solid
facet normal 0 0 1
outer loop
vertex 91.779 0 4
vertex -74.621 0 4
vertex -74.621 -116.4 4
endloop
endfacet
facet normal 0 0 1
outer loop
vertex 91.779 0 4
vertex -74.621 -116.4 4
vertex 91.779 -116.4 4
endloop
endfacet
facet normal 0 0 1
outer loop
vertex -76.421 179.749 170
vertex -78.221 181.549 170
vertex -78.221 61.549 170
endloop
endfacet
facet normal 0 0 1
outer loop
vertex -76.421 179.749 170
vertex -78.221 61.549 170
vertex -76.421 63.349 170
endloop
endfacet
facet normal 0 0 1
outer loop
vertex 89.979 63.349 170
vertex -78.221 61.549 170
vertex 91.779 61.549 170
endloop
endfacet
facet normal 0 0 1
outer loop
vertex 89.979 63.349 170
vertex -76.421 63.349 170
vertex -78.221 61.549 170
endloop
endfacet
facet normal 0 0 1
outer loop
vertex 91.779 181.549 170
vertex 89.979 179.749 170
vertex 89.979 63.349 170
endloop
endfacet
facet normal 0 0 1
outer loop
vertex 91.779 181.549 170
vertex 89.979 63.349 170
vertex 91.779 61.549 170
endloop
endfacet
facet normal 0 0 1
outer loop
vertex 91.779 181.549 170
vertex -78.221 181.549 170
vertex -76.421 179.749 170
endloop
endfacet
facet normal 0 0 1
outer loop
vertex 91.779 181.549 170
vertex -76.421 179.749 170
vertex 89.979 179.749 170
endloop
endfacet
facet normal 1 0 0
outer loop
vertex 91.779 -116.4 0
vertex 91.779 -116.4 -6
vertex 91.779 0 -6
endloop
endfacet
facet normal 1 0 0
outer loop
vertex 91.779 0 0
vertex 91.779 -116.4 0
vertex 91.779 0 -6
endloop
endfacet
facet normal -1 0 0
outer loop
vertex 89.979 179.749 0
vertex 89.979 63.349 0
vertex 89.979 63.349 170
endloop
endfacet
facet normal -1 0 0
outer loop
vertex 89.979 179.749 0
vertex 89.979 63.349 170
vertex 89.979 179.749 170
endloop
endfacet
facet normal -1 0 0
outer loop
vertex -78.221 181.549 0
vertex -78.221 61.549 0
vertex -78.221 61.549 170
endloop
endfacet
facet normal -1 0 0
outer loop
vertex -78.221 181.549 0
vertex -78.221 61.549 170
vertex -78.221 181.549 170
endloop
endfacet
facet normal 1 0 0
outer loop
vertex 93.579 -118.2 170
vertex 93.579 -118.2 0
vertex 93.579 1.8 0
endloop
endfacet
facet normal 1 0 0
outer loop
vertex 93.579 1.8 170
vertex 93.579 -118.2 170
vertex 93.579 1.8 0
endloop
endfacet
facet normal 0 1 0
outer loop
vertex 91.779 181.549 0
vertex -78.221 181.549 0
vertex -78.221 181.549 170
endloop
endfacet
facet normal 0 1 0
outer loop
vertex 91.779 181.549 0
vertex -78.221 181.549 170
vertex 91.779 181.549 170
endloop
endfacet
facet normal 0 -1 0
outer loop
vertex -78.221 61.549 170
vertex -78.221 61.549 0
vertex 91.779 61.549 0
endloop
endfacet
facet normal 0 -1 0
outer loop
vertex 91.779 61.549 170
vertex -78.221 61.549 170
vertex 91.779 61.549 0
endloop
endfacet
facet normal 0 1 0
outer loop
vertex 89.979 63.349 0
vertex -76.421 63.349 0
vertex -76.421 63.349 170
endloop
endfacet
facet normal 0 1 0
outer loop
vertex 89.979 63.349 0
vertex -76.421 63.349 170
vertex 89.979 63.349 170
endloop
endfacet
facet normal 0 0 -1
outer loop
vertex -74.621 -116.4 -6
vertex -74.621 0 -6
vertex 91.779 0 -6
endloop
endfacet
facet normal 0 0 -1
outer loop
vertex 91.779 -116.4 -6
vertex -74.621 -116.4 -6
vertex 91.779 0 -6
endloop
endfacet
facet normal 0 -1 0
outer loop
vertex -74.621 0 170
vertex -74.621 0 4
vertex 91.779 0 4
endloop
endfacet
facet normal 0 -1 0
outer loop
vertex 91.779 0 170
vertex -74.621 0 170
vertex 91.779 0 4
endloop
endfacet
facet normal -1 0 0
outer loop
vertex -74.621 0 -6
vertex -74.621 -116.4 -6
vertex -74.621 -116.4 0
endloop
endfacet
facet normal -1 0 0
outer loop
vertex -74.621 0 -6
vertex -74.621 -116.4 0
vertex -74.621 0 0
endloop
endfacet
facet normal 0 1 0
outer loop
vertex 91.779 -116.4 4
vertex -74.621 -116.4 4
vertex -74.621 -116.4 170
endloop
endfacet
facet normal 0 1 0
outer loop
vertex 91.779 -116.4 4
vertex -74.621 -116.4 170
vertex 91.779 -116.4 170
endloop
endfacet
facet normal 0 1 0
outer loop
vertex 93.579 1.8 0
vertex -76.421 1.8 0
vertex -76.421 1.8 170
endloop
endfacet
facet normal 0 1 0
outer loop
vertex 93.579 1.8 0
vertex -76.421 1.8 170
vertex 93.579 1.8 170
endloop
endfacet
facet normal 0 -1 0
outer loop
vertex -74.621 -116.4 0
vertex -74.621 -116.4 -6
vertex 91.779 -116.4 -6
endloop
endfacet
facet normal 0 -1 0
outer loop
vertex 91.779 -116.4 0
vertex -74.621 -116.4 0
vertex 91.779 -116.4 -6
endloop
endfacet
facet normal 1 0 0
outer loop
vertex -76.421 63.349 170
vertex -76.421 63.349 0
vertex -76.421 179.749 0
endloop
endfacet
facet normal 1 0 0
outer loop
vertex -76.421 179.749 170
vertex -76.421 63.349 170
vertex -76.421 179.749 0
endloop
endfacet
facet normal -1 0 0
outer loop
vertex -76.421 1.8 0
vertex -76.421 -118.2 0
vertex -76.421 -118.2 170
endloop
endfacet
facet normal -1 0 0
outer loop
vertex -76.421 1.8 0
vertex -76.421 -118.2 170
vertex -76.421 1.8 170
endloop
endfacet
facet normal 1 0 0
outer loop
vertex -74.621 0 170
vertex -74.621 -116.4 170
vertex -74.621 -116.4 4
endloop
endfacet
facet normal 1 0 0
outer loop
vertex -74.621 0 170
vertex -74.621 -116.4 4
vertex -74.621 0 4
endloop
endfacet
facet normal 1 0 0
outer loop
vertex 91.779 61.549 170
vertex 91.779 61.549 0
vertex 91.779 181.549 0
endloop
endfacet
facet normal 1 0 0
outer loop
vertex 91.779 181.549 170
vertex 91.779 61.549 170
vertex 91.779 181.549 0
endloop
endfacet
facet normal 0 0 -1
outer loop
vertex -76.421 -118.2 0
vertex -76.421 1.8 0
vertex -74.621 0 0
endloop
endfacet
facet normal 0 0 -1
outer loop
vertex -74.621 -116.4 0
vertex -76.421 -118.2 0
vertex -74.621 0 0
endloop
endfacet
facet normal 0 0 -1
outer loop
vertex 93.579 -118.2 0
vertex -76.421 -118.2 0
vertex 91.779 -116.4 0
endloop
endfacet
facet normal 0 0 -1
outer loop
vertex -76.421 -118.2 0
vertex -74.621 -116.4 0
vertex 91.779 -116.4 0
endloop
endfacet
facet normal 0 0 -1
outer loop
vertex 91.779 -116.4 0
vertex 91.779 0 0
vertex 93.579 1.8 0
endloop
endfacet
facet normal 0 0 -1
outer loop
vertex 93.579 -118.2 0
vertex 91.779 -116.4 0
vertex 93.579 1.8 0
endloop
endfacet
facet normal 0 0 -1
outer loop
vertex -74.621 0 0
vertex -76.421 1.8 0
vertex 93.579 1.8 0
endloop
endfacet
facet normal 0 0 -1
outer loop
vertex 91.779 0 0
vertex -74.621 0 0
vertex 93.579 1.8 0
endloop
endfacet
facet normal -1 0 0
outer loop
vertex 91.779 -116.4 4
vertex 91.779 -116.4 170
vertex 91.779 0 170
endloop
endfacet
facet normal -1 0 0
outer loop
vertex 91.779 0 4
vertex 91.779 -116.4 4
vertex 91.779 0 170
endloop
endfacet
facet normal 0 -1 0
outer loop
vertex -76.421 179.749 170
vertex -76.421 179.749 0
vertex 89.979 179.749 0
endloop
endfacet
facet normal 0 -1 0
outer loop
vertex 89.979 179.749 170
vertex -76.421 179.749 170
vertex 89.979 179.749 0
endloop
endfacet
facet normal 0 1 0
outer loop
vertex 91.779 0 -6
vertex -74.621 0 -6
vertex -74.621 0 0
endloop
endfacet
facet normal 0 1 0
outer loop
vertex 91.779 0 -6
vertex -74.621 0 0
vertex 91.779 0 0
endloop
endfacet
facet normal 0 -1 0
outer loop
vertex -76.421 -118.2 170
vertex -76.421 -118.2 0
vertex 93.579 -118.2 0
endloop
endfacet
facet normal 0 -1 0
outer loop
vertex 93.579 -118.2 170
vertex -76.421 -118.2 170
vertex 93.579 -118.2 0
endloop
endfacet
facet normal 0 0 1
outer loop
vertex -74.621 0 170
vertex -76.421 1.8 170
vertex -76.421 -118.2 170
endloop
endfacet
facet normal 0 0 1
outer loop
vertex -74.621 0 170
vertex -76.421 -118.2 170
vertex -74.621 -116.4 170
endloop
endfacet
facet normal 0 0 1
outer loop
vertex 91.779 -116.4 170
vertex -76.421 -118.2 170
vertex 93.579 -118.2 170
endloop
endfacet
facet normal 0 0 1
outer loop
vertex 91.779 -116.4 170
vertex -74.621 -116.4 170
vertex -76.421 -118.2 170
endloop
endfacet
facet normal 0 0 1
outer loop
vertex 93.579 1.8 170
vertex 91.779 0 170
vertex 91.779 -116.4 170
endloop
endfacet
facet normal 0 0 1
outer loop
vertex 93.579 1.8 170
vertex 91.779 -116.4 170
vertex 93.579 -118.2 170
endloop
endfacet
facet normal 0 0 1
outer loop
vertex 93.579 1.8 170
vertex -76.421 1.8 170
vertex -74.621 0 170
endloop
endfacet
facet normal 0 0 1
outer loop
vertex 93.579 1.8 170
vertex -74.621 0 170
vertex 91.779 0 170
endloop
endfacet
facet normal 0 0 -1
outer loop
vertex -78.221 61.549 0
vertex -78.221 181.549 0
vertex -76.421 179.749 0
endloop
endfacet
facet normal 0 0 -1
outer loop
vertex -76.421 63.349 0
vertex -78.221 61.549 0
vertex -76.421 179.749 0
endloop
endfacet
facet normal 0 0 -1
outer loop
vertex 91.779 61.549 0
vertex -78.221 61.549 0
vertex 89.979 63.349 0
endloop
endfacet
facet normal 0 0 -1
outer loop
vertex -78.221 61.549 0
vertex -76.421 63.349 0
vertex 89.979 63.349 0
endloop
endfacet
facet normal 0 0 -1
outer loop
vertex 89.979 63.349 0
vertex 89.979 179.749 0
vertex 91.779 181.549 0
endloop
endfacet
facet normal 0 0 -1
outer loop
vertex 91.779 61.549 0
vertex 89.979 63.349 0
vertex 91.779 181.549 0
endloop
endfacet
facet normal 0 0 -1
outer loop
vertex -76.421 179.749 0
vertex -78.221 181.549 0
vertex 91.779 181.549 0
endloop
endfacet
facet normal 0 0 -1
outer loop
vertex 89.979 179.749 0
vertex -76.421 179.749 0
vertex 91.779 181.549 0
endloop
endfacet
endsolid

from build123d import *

# Parameters (mm, degrees)
F0_W     = 166.4
F0_H     = 116.4
F1_DEPTH = 170
F0_W_2   = 170
F0_H_2   = 120
F2_DEPTH = 170
F4_DEPTH = 1
F5_DEPTH = 5
F6_DEPTH = 170


with BuildPart() as f1:
    # F0 (on Top) → F1 (new body)
    with BuildSketch(Plane.XY):
        with Locations((6.7789069265, 121.5492137671)):
            Rectangle(F0_W, F0_H)
    extrude(amount=F1_DEPTH)


with BuildPart() as f2:
    # F0 (on Top) → F2 (new body)
    with BuildSketch(Plane.XY):
        with Locations((6.7789069265, 121.5492137671)):
            Rectangle(F0_W_2, F0_H_2)
        with Locations((6.7789069265, 121.5492137671)):
            Rectangle(F0_W, F0_H, mode=Mode.SUBTRACT)
    extrude(amount=F2_DEPTH)

    # F3: cut F1
    add(f1.part, mode=Mode.SUBTRACT)


with BuildPart() as f4:
    # F0 (on Top) → F4 (new body, symmetric)
    with BuildSketch(Plane.XY):
        with Locations((8.5789069265, -58.2)):
            Rectangle(F0_W, F0_H)
    extrude(amount=F4_DEPTH, both=True)


with BuildPart() as f5:
    # F5 (new, symmetric): a face of the model
    f5_faces = [f4.part.faces().sort_by_distance(p)[0] for p in [
        (8.5789069265, -58.2, -1),
    ]]
    extrude(f5_faces, amount=F5_DEPTH, both=True)


with BuildPart() as f4_1:
    add(f4.part)

    add(f5.part)  # F6 merges F5
    # F0 (on Top) → F6 (join)
    with BuildSketch(Plane.XY):
        with Locations((8.5789069265, -58.2)):
            Rectangle(F0_W_2, F0_H_2)
        with Locations((8.5789069265, -58.2)):
            Rectangle(F0_W, F0_H, mode=Mode.SUBTRACT)
    extrude(amount=F6_DEPTH)


solid = Compound([f2.part, f4_1.part])
